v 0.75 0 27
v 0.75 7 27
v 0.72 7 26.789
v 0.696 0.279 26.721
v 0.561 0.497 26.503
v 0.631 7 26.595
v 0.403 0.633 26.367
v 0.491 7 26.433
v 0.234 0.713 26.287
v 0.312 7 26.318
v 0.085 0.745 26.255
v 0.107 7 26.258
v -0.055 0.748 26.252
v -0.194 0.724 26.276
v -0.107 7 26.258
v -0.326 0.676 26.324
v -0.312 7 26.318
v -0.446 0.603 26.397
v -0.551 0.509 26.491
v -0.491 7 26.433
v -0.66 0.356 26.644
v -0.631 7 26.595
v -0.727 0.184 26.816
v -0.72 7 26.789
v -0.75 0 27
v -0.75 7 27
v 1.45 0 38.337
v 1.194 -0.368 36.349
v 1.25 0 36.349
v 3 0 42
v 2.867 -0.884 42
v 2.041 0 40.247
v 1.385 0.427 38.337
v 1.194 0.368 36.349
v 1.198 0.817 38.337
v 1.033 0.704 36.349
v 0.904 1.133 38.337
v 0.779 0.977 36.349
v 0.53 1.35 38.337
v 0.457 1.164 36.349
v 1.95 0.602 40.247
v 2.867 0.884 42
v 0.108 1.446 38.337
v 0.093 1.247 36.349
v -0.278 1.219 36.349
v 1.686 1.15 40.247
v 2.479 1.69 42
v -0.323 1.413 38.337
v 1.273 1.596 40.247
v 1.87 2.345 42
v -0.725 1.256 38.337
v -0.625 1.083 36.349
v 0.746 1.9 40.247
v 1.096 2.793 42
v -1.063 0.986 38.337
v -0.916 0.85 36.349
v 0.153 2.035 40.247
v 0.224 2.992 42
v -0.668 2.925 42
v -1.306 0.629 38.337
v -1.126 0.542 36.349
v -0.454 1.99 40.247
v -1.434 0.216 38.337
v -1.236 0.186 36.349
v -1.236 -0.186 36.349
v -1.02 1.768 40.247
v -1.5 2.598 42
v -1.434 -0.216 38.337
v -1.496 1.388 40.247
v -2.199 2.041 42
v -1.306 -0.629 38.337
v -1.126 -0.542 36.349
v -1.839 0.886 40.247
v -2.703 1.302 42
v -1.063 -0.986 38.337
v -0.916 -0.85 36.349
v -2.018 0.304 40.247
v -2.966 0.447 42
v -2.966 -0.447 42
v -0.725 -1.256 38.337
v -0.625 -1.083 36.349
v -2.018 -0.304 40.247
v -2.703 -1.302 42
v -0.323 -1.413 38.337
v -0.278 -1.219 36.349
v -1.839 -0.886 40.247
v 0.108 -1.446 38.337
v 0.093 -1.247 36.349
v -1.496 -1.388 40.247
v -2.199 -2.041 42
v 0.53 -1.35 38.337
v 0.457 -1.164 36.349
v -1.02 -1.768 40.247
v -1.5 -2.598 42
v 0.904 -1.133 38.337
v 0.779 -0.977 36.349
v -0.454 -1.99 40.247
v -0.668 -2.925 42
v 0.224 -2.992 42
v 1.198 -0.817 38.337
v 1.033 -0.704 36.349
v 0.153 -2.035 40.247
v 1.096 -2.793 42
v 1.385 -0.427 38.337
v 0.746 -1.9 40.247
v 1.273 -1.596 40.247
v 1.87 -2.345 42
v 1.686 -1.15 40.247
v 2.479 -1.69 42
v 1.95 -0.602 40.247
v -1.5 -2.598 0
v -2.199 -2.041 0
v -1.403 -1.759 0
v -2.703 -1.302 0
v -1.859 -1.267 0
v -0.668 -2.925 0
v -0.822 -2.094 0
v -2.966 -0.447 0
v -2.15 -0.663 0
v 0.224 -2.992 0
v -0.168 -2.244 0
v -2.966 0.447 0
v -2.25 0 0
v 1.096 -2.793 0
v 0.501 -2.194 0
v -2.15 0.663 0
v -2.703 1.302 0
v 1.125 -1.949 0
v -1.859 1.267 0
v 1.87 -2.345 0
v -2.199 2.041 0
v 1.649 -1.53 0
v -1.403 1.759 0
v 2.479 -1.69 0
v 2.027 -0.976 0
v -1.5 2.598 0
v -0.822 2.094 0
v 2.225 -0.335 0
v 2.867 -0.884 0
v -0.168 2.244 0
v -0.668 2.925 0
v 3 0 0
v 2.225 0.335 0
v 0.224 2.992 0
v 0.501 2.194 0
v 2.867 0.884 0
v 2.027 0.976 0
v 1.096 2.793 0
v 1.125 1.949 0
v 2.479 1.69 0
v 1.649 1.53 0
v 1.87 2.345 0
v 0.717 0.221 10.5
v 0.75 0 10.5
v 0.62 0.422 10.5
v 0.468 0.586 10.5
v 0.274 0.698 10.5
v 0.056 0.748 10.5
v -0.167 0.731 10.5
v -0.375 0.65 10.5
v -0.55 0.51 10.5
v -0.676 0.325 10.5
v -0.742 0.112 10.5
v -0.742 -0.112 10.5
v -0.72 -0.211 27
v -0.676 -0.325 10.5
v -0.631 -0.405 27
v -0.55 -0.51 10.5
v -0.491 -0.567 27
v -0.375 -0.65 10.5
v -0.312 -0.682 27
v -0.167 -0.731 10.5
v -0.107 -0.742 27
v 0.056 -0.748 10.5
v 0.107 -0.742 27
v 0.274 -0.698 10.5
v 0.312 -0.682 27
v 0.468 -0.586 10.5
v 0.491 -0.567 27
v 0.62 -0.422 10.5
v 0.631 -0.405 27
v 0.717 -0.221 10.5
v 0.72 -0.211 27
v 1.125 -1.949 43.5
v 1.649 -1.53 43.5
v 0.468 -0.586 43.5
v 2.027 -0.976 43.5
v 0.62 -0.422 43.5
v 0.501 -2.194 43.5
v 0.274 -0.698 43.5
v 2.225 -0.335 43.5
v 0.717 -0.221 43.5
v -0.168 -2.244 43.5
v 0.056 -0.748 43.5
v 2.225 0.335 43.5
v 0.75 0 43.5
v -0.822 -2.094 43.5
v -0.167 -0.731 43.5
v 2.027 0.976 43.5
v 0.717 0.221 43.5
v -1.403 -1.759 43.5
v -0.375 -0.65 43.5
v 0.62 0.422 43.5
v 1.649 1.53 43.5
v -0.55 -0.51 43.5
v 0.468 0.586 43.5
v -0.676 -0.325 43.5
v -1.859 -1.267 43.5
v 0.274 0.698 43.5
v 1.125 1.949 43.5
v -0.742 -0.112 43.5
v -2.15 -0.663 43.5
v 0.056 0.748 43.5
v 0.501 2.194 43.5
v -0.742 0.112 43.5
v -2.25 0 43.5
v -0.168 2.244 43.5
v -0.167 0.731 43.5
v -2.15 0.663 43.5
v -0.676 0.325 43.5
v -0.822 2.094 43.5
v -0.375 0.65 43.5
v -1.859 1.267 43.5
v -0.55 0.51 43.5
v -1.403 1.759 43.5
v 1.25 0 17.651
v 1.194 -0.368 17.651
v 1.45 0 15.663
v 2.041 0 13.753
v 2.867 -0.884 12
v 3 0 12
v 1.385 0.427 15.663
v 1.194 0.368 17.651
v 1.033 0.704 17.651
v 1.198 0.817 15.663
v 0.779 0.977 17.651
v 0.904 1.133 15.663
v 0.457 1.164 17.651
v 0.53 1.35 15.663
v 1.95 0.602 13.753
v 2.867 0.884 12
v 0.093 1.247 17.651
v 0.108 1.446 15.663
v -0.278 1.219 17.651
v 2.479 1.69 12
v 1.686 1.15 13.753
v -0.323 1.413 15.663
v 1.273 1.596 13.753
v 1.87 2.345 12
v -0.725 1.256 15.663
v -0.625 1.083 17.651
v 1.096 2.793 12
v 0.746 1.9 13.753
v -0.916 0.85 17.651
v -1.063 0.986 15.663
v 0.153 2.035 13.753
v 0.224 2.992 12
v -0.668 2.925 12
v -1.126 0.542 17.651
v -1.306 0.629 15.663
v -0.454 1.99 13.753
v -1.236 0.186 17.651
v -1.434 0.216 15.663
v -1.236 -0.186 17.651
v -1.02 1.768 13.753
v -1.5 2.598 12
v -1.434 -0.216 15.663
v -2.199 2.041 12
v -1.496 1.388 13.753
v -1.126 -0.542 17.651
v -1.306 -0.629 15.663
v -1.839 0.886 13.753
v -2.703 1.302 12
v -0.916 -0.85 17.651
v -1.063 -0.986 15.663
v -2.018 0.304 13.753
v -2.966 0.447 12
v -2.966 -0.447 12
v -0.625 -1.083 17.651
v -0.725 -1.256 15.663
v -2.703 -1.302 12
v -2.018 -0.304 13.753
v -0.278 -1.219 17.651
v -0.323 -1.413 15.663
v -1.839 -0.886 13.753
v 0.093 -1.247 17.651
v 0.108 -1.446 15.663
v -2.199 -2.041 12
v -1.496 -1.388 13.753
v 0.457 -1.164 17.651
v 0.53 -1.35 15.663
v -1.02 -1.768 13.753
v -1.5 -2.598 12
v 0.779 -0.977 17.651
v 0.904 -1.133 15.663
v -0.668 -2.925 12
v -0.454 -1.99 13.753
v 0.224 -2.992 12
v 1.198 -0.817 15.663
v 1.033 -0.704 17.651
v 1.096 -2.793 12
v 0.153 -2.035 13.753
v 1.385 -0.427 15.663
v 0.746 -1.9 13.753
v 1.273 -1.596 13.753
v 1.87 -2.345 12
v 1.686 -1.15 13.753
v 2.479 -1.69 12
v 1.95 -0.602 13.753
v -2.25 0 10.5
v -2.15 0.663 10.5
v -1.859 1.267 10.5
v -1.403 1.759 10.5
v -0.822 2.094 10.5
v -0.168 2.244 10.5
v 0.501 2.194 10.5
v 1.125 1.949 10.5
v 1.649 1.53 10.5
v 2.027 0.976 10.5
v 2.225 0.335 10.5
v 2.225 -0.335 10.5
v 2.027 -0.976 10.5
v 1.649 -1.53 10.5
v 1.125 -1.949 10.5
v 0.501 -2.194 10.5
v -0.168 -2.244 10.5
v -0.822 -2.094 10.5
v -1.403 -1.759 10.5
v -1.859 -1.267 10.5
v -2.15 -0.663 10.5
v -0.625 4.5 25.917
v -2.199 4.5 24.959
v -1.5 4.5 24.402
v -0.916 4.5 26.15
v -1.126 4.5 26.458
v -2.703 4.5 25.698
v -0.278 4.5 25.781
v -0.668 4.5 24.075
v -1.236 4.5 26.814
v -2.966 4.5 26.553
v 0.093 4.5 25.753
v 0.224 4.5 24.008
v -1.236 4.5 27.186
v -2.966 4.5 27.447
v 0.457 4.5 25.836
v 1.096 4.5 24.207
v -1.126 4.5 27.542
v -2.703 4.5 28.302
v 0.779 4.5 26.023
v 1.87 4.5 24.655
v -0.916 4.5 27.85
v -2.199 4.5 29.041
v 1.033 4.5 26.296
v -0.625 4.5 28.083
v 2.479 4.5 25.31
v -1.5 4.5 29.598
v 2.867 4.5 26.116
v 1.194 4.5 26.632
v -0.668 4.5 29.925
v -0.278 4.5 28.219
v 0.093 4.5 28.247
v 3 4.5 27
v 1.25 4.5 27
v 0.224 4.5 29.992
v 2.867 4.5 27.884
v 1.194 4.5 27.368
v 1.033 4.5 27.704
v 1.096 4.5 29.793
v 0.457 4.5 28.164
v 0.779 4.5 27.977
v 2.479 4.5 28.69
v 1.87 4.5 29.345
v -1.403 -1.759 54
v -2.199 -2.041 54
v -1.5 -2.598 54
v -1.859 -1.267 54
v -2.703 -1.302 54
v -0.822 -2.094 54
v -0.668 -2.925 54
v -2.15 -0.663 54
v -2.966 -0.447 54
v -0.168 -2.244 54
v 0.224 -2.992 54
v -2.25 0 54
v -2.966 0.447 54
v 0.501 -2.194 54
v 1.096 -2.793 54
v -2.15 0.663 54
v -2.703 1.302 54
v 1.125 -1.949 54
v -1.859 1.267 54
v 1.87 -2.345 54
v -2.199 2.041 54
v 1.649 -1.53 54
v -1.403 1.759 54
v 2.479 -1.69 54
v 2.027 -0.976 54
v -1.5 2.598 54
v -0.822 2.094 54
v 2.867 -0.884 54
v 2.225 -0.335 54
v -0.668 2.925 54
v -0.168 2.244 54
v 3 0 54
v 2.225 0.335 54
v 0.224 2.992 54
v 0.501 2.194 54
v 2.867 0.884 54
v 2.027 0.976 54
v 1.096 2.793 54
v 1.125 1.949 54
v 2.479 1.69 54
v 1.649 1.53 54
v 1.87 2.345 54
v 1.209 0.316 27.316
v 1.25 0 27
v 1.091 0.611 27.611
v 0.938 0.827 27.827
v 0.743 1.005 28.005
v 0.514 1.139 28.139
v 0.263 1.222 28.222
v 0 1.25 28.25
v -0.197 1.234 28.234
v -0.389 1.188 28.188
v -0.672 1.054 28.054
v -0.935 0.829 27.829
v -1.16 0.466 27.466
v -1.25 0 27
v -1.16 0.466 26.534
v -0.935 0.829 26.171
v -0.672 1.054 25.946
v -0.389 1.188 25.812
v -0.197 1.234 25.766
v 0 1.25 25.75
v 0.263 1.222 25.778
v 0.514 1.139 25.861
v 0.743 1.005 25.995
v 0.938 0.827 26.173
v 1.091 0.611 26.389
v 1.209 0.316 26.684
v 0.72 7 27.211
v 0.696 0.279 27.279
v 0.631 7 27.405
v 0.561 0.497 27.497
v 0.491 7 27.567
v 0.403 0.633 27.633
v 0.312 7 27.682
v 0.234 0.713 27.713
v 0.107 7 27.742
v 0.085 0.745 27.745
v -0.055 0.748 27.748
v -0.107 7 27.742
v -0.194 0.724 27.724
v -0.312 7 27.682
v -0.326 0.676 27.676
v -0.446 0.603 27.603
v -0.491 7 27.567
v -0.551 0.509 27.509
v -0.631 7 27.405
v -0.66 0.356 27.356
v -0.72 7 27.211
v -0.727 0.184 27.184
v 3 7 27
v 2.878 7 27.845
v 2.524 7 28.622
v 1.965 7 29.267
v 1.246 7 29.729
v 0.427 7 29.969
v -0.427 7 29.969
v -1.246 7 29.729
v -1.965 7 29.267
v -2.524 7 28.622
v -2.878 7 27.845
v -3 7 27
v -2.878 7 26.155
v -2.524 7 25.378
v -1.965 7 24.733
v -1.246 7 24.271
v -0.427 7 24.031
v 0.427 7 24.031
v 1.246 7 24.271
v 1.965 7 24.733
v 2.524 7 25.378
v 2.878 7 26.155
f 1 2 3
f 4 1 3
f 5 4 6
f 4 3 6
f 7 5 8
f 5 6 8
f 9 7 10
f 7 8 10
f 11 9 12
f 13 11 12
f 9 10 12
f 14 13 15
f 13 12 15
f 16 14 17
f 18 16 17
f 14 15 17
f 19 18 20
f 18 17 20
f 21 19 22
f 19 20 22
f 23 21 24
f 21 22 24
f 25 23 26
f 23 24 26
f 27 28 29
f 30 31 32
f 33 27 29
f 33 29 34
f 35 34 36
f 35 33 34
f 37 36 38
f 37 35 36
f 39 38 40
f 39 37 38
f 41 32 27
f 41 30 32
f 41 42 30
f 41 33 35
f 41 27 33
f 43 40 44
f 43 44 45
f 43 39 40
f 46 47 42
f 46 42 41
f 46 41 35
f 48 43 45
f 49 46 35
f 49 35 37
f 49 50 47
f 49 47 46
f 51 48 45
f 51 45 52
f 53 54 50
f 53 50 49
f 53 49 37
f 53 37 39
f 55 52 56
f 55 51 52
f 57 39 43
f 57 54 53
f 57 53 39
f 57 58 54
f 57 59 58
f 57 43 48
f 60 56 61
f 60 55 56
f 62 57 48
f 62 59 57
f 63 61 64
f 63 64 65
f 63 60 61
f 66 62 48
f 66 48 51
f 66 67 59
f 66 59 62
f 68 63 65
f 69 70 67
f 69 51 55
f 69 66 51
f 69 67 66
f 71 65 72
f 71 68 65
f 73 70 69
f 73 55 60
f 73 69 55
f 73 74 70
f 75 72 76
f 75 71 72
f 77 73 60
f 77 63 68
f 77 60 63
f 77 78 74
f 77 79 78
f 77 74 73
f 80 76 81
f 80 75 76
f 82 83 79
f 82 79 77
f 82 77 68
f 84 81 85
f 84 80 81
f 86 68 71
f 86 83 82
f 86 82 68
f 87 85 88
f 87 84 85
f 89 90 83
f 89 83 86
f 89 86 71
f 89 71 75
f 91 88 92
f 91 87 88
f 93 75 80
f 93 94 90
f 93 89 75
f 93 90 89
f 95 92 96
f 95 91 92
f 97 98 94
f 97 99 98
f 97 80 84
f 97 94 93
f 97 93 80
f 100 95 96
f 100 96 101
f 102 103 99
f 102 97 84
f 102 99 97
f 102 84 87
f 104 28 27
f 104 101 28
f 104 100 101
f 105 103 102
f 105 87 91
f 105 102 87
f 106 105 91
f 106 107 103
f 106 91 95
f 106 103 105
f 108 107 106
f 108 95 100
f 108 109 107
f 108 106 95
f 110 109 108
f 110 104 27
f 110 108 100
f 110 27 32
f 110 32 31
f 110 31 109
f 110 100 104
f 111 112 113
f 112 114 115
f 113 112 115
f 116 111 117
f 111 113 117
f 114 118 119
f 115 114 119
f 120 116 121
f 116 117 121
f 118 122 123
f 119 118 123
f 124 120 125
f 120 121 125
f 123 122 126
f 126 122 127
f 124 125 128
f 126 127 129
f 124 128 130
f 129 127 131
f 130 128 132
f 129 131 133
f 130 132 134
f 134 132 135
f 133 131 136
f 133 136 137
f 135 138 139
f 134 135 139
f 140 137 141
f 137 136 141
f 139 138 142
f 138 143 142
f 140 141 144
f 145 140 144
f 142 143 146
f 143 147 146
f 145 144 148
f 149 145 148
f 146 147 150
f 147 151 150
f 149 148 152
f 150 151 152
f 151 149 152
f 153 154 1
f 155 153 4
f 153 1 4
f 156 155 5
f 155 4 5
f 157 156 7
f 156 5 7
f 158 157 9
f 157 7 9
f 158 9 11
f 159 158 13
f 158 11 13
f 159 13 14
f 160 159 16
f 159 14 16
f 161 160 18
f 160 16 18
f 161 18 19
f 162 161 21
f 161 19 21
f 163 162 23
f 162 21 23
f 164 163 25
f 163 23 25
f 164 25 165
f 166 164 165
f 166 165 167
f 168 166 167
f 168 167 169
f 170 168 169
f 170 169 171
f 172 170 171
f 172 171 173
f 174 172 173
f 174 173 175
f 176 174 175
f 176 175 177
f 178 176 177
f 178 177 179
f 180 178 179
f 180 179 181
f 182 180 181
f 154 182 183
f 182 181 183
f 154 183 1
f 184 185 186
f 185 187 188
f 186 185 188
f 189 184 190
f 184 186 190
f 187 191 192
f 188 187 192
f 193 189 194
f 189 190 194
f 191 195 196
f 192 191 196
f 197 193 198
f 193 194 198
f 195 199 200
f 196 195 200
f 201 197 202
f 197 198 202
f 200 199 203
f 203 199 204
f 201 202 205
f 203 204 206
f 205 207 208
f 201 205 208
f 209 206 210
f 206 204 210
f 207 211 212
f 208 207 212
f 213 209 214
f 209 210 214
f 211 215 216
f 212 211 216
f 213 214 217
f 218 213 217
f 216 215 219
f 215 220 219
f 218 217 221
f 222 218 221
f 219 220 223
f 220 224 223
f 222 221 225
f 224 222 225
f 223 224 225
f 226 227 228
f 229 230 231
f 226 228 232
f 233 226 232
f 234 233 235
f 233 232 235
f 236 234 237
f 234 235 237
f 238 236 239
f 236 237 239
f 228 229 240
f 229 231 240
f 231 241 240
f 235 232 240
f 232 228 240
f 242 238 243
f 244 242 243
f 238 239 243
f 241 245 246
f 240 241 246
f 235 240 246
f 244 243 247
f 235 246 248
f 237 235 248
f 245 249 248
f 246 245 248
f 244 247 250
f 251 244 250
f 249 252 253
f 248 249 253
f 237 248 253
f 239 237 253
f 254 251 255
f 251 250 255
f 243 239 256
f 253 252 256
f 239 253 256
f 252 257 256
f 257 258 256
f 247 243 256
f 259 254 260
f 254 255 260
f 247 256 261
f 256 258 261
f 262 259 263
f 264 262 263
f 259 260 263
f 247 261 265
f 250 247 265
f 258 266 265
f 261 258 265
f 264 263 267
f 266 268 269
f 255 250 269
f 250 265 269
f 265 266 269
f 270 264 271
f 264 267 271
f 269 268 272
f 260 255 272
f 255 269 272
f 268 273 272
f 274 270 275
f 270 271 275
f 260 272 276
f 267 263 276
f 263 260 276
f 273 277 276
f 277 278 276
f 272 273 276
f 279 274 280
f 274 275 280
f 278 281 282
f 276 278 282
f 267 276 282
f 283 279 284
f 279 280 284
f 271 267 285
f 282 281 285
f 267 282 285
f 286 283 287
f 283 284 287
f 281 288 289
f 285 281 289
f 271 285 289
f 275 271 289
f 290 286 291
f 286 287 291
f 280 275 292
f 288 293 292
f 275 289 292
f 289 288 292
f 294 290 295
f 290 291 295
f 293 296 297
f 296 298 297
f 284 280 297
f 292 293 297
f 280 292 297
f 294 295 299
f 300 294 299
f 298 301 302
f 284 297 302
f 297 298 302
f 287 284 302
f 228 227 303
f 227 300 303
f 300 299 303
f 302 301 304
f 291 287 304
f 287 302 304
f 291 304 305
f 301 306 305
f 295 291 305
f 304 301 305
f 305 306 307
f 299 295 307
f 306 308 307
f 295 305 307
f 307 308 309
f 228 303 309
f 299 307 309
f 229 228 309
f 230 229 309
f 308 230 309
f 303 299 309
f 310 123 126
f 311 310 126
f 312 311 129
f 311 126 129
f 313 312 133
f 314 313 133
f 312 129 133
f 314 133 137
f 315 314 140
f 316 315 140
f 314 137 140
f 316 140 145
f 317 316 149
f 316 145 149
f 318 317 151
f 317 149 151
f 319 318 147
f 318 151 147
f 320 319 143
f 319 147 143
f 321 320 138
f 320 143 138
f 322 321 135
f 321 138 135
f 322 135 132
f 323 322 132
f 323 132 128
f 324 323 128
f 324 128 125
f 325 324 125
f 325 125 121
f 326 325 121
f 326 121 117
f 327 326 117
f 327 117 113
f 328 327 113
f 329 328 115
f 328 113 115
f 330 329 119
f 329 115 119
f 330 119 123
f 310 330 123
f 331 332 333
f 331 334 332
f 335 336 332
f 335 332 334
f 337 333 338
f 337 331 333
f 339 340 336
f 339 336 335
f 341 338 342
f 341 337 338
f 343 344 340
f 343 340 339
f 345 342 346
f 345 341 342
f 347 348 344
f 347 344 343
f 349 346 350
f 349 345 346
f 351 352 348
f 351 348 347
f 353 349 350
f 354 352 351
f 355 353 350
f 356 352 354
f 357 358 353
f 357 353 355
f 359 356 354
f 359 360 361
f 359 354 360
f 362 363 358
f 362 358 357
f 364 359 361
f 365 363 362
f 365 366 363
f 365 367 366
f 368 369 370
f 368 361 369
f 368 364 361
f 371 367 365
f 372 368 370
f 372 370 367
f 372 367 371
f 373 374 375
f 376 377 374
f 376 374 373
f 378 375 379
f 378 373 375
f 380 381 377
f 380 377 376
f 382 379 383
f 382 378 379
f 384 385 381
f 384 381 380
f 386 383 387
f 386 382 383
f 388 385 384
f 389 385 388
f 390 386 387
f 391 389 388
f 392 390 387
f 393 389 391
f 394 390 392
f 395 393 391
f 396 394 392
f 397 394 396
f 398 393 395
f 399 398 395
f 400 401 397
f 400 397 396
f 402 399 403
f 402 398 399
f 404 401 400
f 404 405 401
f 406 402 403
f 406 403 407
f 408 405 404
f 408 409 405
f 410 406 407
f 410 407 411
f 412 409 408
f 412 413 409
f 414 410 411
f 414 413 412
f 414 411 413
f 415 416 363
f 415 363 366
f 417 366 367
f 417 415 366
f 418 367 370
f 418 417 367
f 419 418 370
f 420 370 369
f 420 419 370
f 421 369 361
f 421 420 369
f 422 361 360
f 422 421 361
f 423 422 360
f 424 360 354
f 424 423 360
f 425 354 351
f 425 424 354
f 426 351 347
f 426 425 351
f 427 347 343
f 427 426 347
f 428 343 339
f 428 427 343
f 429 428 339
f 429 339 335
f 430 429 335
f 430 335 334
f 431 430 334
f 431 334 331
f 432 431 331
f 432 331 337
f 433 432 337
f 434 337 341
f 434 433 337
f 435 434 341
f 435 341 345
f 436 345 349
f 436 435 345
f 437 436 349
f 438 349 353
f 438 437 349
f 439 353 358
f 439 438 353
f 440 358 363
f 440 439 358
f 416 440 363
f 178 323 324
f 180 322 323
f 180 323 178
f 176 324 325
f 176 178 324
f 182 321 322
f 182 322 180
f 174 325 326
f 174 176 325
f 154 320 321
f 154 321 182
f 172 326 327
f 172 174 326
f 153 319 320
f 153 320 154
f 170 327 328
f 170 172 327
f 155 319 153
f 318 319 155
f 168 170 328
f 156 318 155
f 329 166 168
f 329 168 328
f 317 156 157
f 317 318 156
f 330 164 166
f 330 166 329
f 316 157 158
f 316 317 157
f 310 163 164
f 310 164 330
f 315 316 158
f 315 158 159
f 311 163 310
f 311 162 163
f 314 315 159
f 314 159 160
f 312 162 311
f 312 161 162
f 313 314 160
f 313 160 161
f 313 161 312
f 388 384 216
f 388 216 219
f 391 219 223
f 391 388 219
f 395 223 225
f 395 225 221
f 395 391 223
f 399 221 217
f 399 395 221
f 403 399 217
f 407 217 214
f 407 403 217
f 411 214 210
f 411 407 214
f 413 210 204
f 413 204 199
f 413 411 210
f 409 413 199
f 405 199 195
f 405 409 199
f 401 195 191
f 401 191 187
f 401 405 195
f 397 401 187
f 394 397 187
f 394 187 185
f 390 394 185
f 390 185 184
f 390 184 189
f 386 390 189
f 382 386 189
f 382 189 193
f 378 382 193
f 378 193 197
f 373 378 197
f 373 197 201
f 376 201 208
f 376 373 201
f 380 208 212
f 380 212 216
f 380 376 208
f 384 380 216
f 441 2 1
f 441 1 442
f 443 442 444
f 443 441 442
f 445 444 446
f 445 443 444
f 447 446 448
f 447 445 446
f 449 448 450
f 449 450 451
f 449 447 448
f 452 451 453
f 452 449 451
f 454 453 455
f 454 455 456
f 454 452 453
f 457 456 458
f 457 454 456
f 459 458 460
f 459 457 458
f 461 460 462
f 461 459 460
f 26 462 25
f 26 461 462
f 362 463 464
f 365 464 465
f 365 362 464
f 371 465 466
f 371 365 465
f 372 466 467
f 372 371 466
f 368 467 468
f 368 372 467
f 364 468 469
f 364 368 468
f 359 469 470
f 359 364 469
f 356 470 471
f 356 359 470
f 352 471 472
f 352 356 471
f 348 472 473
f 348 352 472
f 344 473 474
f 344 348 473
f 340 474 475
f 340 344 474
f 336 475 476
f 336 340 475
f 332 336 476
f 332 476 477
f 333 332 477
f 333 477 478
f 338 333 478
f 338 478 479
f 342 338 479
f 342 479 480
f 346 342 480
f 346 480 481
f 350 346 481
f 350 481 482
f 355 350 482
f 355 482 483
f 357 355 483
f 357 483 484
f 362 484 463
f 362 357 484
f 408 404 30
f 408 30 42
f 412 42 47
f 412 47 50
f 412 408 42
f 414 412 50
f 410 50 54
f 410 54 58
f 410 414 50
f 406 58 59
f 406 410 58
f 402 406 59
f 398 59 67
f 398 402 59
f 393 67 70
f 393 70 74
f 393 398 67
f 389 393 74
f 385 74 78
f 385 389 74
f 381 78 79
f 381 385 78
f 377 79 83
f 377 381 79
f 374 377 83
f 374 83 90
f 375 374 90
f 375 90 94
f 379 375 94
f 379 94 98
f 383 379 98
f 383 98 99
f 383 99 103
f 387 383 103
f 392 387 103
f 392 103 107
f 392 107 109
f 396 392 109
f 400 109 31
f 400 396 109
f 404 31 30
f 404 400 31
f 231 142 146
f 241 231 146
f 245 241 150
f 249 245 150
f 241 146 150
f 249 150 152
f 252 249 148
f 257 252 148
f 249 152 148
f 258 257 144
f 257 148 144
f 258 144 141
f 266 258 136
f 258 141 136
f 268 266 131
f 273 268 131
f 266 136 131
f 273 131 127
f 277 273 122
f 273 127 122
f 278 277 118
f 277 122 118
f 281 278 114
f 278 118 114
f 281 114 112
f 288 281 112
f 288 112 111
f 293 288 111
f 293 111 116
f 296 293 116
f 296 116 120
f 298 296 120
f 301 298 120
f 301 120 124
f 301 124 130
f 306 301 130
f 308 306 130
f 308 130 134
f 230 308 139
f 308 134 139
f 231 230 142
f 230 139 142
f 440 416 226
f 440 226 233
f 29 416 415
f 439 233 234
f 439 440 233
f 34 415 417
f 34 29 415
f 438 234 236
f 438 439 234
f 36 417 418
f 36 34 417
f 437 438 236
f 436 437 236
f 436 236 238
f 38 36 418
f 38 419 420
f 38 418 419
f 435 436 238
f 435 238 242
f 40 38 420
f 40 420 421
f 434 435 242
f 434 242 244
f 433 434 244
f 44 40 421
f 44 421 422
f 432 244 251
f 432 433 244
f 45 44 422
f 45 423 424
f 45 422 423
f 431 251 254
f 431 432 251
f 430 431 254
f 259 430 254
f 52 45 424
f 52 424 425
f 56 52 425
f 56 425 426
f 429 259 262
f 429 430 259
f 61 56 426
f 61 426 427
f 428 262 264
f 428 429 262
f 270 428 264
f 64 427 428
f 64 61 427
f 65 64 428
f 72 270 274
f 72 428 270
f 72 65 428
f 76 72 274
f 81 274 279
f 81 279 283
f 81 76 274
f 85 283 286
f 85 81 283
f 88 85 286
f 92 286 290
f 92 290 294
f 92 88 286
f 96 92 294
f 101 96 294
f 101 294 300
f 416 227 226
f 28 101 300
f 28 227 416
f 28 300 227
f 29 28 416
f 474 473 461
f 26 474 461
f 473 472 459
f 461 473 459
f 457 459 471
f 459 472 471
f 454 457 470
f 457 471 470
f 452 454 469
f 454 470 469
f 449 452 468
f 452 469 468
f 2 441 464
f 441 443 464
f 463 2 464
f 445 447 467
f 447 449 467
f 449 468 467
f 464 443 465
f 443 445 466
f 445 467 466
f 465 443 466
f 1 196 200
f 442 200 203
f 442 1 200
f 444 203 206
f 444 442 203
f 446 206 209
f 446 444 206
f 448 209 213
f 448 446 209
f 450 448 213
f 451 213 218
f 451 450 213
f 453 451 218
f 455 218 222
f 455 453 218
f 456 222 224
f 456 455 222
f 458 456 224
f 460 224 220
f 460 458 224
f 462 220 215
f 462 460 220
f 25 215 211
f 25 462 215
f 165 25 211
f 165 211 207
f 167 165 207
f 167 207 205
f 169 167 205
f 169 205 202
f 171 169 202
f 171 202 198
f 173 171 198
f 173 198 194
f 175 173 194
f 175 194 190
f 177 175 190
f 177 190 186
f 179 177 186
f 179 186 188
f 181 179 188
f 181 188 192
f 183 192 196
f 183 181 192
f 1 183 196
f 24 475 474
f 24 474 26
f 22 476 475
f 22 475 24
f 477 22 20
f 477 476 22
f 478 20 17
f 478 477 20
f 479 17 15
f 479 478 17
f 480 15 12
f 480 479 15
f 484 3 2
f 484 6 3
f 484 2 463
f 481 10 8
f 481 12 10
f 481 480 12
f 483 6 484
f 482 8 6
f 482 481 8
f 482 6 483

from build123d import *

# Parameters (mm, degrees)
SKETCH1_R           = 3
BOSS_EXTRUDE1_DEPTH = 12
SKETCH2_R           = 1.25
BOSS_EXTRUDE2_DEPTH = 15
BOSS_EXTRUDE3_DEPTH = 4.5
BOSS_EXTRUDE4_DEPTH = 2.5
SKETCH5_R           = 2.25
CUT_EXTRUDE1_DEPTH  = 10.5
SKETCH6_R           = 0.75
CUT_EXTRUDE2_DEPTH  = 21.5
CUT_EXTRUDE3_DEPTH  = 7
FILLET1_R           = 10


with BuildPart() as part:
    # Sketch1 → Boss-Extrude1 (new body)
    with BuildSketch(Plane.XY):
        Circle(SKETCH1_R)
    extrude(amount=BOSS_EXTRUDE1_DEPTH)

    # Sketch2 → Boss-Extrude2 (add)
    with BuildSketch(Plane.XY.offset(12)):
        Circle(SKETCH2_R)
    extrude(amount=BOSS_EXTRUDE2_DEPTH)

    # Sketch3 → Boss-Extrude3 (add)
    with BuildSketch(Plane(origin=(0, 0, 0), x_dir=(1, 0, 0), z_dir=(0, 1, 0))):
        with BuildLine():
            Line((-1.25, -27), (1.25, -27))
            ThreePointArc((1.25, -27), (0, -25.75), (-1.25, -27))
        make_face()
    extrude(amount=BOSS_EXTRUDE3_DEPTH)

    # Sketch4 → Boss-Extrude4 (add)
    with BuildSketch(Plane(origin=(0, 4.5, 0), x_dir=(1, 0, 0), z_dir=(0, 1, 0))):
        with BuildLine():
            Line((-3, -27), (3, -27))
            ThreePointArc((3, -27), (0, -24), (-3, -27))
        make_face()
    extrude(amount=BOSS_EXTRUDE4_DEPTH)

    # Sketch5 → Cut-Extrude1 (cut)
    with BuildSketch(Plane(origin=(0, 0, 0), x_dir=(-1, 0, 0), z_dir=(0, 0, -1))):
        Circle(SKETCH5_R)
    extrude(amount=-CUT_EXTRUDE1_DEPTH, mode=Mode.SUBTRACT)

    # Sketch6 → Cut-Extrude2 (cut)
    with BuildSketch(Plane.XY.offset(27)):
        Circle(SKETCH6_R)
    extrude(amount=-CUT_EXTRUDE2_DEPTH, mode=Mode.SUBTRACT)

    # Sketch7 → Cut-Extrude3 (cut)
    with BuildSketch(Plane(origin=(0, 7, 0), x_dir=(1, 0, 0), z_dir=(0, 1, 0))):
        with BuildLine():
            Line((-0.75, -27), (-0.75, -27.055459171))
            Line((-0.75, -27.055459171), (0.75, -27.055459171))
            Line((0.75, -27.055459171), (0.75, -27))
            ThreePointArc((0.75, -27), (0, -26.25), (-0.75, -27))
        make_face()
    extrude(amount=-CUT_EXTRUDE3_DEPTH, mode=Mode.SUBTRACT)

    # Fillet1
    # the kernel refuses this fillet: 10 mm, written as the material it adds along each edge
    with BuildSketch(Plane(origin=(0, 0, 12), x_dir=(1, 0, 0), z_dir=(0, -1, 0))) as fillet1_piece_1:
        with BuildLine():
            CenterArc((11.25, 5.651327278), FILLET1_R, 180, 34.41150867)
            Line((3, 0), (2.835, -0.113026546))
            ThreePointArc((2.835, -0.113026546), (2.125, -0.2), (1.25, -0.2))
            Line((1.25, -0.2), (1.05, 0))
            Line((1.05, 0), (1.05, 5.651327278))
            Line((1.05, 5.651327278), (1.25, 5.651327278))
        make_face()
    revolve(axis=Axis((0, 0, 12), (0, 0, 1)))

    # Mirror5: part across plane


with BuildPart() as part_1:
    add(part.part)
    add(part.part.mirror(Plane.XY.offset(27)))


solid = part_1.part
